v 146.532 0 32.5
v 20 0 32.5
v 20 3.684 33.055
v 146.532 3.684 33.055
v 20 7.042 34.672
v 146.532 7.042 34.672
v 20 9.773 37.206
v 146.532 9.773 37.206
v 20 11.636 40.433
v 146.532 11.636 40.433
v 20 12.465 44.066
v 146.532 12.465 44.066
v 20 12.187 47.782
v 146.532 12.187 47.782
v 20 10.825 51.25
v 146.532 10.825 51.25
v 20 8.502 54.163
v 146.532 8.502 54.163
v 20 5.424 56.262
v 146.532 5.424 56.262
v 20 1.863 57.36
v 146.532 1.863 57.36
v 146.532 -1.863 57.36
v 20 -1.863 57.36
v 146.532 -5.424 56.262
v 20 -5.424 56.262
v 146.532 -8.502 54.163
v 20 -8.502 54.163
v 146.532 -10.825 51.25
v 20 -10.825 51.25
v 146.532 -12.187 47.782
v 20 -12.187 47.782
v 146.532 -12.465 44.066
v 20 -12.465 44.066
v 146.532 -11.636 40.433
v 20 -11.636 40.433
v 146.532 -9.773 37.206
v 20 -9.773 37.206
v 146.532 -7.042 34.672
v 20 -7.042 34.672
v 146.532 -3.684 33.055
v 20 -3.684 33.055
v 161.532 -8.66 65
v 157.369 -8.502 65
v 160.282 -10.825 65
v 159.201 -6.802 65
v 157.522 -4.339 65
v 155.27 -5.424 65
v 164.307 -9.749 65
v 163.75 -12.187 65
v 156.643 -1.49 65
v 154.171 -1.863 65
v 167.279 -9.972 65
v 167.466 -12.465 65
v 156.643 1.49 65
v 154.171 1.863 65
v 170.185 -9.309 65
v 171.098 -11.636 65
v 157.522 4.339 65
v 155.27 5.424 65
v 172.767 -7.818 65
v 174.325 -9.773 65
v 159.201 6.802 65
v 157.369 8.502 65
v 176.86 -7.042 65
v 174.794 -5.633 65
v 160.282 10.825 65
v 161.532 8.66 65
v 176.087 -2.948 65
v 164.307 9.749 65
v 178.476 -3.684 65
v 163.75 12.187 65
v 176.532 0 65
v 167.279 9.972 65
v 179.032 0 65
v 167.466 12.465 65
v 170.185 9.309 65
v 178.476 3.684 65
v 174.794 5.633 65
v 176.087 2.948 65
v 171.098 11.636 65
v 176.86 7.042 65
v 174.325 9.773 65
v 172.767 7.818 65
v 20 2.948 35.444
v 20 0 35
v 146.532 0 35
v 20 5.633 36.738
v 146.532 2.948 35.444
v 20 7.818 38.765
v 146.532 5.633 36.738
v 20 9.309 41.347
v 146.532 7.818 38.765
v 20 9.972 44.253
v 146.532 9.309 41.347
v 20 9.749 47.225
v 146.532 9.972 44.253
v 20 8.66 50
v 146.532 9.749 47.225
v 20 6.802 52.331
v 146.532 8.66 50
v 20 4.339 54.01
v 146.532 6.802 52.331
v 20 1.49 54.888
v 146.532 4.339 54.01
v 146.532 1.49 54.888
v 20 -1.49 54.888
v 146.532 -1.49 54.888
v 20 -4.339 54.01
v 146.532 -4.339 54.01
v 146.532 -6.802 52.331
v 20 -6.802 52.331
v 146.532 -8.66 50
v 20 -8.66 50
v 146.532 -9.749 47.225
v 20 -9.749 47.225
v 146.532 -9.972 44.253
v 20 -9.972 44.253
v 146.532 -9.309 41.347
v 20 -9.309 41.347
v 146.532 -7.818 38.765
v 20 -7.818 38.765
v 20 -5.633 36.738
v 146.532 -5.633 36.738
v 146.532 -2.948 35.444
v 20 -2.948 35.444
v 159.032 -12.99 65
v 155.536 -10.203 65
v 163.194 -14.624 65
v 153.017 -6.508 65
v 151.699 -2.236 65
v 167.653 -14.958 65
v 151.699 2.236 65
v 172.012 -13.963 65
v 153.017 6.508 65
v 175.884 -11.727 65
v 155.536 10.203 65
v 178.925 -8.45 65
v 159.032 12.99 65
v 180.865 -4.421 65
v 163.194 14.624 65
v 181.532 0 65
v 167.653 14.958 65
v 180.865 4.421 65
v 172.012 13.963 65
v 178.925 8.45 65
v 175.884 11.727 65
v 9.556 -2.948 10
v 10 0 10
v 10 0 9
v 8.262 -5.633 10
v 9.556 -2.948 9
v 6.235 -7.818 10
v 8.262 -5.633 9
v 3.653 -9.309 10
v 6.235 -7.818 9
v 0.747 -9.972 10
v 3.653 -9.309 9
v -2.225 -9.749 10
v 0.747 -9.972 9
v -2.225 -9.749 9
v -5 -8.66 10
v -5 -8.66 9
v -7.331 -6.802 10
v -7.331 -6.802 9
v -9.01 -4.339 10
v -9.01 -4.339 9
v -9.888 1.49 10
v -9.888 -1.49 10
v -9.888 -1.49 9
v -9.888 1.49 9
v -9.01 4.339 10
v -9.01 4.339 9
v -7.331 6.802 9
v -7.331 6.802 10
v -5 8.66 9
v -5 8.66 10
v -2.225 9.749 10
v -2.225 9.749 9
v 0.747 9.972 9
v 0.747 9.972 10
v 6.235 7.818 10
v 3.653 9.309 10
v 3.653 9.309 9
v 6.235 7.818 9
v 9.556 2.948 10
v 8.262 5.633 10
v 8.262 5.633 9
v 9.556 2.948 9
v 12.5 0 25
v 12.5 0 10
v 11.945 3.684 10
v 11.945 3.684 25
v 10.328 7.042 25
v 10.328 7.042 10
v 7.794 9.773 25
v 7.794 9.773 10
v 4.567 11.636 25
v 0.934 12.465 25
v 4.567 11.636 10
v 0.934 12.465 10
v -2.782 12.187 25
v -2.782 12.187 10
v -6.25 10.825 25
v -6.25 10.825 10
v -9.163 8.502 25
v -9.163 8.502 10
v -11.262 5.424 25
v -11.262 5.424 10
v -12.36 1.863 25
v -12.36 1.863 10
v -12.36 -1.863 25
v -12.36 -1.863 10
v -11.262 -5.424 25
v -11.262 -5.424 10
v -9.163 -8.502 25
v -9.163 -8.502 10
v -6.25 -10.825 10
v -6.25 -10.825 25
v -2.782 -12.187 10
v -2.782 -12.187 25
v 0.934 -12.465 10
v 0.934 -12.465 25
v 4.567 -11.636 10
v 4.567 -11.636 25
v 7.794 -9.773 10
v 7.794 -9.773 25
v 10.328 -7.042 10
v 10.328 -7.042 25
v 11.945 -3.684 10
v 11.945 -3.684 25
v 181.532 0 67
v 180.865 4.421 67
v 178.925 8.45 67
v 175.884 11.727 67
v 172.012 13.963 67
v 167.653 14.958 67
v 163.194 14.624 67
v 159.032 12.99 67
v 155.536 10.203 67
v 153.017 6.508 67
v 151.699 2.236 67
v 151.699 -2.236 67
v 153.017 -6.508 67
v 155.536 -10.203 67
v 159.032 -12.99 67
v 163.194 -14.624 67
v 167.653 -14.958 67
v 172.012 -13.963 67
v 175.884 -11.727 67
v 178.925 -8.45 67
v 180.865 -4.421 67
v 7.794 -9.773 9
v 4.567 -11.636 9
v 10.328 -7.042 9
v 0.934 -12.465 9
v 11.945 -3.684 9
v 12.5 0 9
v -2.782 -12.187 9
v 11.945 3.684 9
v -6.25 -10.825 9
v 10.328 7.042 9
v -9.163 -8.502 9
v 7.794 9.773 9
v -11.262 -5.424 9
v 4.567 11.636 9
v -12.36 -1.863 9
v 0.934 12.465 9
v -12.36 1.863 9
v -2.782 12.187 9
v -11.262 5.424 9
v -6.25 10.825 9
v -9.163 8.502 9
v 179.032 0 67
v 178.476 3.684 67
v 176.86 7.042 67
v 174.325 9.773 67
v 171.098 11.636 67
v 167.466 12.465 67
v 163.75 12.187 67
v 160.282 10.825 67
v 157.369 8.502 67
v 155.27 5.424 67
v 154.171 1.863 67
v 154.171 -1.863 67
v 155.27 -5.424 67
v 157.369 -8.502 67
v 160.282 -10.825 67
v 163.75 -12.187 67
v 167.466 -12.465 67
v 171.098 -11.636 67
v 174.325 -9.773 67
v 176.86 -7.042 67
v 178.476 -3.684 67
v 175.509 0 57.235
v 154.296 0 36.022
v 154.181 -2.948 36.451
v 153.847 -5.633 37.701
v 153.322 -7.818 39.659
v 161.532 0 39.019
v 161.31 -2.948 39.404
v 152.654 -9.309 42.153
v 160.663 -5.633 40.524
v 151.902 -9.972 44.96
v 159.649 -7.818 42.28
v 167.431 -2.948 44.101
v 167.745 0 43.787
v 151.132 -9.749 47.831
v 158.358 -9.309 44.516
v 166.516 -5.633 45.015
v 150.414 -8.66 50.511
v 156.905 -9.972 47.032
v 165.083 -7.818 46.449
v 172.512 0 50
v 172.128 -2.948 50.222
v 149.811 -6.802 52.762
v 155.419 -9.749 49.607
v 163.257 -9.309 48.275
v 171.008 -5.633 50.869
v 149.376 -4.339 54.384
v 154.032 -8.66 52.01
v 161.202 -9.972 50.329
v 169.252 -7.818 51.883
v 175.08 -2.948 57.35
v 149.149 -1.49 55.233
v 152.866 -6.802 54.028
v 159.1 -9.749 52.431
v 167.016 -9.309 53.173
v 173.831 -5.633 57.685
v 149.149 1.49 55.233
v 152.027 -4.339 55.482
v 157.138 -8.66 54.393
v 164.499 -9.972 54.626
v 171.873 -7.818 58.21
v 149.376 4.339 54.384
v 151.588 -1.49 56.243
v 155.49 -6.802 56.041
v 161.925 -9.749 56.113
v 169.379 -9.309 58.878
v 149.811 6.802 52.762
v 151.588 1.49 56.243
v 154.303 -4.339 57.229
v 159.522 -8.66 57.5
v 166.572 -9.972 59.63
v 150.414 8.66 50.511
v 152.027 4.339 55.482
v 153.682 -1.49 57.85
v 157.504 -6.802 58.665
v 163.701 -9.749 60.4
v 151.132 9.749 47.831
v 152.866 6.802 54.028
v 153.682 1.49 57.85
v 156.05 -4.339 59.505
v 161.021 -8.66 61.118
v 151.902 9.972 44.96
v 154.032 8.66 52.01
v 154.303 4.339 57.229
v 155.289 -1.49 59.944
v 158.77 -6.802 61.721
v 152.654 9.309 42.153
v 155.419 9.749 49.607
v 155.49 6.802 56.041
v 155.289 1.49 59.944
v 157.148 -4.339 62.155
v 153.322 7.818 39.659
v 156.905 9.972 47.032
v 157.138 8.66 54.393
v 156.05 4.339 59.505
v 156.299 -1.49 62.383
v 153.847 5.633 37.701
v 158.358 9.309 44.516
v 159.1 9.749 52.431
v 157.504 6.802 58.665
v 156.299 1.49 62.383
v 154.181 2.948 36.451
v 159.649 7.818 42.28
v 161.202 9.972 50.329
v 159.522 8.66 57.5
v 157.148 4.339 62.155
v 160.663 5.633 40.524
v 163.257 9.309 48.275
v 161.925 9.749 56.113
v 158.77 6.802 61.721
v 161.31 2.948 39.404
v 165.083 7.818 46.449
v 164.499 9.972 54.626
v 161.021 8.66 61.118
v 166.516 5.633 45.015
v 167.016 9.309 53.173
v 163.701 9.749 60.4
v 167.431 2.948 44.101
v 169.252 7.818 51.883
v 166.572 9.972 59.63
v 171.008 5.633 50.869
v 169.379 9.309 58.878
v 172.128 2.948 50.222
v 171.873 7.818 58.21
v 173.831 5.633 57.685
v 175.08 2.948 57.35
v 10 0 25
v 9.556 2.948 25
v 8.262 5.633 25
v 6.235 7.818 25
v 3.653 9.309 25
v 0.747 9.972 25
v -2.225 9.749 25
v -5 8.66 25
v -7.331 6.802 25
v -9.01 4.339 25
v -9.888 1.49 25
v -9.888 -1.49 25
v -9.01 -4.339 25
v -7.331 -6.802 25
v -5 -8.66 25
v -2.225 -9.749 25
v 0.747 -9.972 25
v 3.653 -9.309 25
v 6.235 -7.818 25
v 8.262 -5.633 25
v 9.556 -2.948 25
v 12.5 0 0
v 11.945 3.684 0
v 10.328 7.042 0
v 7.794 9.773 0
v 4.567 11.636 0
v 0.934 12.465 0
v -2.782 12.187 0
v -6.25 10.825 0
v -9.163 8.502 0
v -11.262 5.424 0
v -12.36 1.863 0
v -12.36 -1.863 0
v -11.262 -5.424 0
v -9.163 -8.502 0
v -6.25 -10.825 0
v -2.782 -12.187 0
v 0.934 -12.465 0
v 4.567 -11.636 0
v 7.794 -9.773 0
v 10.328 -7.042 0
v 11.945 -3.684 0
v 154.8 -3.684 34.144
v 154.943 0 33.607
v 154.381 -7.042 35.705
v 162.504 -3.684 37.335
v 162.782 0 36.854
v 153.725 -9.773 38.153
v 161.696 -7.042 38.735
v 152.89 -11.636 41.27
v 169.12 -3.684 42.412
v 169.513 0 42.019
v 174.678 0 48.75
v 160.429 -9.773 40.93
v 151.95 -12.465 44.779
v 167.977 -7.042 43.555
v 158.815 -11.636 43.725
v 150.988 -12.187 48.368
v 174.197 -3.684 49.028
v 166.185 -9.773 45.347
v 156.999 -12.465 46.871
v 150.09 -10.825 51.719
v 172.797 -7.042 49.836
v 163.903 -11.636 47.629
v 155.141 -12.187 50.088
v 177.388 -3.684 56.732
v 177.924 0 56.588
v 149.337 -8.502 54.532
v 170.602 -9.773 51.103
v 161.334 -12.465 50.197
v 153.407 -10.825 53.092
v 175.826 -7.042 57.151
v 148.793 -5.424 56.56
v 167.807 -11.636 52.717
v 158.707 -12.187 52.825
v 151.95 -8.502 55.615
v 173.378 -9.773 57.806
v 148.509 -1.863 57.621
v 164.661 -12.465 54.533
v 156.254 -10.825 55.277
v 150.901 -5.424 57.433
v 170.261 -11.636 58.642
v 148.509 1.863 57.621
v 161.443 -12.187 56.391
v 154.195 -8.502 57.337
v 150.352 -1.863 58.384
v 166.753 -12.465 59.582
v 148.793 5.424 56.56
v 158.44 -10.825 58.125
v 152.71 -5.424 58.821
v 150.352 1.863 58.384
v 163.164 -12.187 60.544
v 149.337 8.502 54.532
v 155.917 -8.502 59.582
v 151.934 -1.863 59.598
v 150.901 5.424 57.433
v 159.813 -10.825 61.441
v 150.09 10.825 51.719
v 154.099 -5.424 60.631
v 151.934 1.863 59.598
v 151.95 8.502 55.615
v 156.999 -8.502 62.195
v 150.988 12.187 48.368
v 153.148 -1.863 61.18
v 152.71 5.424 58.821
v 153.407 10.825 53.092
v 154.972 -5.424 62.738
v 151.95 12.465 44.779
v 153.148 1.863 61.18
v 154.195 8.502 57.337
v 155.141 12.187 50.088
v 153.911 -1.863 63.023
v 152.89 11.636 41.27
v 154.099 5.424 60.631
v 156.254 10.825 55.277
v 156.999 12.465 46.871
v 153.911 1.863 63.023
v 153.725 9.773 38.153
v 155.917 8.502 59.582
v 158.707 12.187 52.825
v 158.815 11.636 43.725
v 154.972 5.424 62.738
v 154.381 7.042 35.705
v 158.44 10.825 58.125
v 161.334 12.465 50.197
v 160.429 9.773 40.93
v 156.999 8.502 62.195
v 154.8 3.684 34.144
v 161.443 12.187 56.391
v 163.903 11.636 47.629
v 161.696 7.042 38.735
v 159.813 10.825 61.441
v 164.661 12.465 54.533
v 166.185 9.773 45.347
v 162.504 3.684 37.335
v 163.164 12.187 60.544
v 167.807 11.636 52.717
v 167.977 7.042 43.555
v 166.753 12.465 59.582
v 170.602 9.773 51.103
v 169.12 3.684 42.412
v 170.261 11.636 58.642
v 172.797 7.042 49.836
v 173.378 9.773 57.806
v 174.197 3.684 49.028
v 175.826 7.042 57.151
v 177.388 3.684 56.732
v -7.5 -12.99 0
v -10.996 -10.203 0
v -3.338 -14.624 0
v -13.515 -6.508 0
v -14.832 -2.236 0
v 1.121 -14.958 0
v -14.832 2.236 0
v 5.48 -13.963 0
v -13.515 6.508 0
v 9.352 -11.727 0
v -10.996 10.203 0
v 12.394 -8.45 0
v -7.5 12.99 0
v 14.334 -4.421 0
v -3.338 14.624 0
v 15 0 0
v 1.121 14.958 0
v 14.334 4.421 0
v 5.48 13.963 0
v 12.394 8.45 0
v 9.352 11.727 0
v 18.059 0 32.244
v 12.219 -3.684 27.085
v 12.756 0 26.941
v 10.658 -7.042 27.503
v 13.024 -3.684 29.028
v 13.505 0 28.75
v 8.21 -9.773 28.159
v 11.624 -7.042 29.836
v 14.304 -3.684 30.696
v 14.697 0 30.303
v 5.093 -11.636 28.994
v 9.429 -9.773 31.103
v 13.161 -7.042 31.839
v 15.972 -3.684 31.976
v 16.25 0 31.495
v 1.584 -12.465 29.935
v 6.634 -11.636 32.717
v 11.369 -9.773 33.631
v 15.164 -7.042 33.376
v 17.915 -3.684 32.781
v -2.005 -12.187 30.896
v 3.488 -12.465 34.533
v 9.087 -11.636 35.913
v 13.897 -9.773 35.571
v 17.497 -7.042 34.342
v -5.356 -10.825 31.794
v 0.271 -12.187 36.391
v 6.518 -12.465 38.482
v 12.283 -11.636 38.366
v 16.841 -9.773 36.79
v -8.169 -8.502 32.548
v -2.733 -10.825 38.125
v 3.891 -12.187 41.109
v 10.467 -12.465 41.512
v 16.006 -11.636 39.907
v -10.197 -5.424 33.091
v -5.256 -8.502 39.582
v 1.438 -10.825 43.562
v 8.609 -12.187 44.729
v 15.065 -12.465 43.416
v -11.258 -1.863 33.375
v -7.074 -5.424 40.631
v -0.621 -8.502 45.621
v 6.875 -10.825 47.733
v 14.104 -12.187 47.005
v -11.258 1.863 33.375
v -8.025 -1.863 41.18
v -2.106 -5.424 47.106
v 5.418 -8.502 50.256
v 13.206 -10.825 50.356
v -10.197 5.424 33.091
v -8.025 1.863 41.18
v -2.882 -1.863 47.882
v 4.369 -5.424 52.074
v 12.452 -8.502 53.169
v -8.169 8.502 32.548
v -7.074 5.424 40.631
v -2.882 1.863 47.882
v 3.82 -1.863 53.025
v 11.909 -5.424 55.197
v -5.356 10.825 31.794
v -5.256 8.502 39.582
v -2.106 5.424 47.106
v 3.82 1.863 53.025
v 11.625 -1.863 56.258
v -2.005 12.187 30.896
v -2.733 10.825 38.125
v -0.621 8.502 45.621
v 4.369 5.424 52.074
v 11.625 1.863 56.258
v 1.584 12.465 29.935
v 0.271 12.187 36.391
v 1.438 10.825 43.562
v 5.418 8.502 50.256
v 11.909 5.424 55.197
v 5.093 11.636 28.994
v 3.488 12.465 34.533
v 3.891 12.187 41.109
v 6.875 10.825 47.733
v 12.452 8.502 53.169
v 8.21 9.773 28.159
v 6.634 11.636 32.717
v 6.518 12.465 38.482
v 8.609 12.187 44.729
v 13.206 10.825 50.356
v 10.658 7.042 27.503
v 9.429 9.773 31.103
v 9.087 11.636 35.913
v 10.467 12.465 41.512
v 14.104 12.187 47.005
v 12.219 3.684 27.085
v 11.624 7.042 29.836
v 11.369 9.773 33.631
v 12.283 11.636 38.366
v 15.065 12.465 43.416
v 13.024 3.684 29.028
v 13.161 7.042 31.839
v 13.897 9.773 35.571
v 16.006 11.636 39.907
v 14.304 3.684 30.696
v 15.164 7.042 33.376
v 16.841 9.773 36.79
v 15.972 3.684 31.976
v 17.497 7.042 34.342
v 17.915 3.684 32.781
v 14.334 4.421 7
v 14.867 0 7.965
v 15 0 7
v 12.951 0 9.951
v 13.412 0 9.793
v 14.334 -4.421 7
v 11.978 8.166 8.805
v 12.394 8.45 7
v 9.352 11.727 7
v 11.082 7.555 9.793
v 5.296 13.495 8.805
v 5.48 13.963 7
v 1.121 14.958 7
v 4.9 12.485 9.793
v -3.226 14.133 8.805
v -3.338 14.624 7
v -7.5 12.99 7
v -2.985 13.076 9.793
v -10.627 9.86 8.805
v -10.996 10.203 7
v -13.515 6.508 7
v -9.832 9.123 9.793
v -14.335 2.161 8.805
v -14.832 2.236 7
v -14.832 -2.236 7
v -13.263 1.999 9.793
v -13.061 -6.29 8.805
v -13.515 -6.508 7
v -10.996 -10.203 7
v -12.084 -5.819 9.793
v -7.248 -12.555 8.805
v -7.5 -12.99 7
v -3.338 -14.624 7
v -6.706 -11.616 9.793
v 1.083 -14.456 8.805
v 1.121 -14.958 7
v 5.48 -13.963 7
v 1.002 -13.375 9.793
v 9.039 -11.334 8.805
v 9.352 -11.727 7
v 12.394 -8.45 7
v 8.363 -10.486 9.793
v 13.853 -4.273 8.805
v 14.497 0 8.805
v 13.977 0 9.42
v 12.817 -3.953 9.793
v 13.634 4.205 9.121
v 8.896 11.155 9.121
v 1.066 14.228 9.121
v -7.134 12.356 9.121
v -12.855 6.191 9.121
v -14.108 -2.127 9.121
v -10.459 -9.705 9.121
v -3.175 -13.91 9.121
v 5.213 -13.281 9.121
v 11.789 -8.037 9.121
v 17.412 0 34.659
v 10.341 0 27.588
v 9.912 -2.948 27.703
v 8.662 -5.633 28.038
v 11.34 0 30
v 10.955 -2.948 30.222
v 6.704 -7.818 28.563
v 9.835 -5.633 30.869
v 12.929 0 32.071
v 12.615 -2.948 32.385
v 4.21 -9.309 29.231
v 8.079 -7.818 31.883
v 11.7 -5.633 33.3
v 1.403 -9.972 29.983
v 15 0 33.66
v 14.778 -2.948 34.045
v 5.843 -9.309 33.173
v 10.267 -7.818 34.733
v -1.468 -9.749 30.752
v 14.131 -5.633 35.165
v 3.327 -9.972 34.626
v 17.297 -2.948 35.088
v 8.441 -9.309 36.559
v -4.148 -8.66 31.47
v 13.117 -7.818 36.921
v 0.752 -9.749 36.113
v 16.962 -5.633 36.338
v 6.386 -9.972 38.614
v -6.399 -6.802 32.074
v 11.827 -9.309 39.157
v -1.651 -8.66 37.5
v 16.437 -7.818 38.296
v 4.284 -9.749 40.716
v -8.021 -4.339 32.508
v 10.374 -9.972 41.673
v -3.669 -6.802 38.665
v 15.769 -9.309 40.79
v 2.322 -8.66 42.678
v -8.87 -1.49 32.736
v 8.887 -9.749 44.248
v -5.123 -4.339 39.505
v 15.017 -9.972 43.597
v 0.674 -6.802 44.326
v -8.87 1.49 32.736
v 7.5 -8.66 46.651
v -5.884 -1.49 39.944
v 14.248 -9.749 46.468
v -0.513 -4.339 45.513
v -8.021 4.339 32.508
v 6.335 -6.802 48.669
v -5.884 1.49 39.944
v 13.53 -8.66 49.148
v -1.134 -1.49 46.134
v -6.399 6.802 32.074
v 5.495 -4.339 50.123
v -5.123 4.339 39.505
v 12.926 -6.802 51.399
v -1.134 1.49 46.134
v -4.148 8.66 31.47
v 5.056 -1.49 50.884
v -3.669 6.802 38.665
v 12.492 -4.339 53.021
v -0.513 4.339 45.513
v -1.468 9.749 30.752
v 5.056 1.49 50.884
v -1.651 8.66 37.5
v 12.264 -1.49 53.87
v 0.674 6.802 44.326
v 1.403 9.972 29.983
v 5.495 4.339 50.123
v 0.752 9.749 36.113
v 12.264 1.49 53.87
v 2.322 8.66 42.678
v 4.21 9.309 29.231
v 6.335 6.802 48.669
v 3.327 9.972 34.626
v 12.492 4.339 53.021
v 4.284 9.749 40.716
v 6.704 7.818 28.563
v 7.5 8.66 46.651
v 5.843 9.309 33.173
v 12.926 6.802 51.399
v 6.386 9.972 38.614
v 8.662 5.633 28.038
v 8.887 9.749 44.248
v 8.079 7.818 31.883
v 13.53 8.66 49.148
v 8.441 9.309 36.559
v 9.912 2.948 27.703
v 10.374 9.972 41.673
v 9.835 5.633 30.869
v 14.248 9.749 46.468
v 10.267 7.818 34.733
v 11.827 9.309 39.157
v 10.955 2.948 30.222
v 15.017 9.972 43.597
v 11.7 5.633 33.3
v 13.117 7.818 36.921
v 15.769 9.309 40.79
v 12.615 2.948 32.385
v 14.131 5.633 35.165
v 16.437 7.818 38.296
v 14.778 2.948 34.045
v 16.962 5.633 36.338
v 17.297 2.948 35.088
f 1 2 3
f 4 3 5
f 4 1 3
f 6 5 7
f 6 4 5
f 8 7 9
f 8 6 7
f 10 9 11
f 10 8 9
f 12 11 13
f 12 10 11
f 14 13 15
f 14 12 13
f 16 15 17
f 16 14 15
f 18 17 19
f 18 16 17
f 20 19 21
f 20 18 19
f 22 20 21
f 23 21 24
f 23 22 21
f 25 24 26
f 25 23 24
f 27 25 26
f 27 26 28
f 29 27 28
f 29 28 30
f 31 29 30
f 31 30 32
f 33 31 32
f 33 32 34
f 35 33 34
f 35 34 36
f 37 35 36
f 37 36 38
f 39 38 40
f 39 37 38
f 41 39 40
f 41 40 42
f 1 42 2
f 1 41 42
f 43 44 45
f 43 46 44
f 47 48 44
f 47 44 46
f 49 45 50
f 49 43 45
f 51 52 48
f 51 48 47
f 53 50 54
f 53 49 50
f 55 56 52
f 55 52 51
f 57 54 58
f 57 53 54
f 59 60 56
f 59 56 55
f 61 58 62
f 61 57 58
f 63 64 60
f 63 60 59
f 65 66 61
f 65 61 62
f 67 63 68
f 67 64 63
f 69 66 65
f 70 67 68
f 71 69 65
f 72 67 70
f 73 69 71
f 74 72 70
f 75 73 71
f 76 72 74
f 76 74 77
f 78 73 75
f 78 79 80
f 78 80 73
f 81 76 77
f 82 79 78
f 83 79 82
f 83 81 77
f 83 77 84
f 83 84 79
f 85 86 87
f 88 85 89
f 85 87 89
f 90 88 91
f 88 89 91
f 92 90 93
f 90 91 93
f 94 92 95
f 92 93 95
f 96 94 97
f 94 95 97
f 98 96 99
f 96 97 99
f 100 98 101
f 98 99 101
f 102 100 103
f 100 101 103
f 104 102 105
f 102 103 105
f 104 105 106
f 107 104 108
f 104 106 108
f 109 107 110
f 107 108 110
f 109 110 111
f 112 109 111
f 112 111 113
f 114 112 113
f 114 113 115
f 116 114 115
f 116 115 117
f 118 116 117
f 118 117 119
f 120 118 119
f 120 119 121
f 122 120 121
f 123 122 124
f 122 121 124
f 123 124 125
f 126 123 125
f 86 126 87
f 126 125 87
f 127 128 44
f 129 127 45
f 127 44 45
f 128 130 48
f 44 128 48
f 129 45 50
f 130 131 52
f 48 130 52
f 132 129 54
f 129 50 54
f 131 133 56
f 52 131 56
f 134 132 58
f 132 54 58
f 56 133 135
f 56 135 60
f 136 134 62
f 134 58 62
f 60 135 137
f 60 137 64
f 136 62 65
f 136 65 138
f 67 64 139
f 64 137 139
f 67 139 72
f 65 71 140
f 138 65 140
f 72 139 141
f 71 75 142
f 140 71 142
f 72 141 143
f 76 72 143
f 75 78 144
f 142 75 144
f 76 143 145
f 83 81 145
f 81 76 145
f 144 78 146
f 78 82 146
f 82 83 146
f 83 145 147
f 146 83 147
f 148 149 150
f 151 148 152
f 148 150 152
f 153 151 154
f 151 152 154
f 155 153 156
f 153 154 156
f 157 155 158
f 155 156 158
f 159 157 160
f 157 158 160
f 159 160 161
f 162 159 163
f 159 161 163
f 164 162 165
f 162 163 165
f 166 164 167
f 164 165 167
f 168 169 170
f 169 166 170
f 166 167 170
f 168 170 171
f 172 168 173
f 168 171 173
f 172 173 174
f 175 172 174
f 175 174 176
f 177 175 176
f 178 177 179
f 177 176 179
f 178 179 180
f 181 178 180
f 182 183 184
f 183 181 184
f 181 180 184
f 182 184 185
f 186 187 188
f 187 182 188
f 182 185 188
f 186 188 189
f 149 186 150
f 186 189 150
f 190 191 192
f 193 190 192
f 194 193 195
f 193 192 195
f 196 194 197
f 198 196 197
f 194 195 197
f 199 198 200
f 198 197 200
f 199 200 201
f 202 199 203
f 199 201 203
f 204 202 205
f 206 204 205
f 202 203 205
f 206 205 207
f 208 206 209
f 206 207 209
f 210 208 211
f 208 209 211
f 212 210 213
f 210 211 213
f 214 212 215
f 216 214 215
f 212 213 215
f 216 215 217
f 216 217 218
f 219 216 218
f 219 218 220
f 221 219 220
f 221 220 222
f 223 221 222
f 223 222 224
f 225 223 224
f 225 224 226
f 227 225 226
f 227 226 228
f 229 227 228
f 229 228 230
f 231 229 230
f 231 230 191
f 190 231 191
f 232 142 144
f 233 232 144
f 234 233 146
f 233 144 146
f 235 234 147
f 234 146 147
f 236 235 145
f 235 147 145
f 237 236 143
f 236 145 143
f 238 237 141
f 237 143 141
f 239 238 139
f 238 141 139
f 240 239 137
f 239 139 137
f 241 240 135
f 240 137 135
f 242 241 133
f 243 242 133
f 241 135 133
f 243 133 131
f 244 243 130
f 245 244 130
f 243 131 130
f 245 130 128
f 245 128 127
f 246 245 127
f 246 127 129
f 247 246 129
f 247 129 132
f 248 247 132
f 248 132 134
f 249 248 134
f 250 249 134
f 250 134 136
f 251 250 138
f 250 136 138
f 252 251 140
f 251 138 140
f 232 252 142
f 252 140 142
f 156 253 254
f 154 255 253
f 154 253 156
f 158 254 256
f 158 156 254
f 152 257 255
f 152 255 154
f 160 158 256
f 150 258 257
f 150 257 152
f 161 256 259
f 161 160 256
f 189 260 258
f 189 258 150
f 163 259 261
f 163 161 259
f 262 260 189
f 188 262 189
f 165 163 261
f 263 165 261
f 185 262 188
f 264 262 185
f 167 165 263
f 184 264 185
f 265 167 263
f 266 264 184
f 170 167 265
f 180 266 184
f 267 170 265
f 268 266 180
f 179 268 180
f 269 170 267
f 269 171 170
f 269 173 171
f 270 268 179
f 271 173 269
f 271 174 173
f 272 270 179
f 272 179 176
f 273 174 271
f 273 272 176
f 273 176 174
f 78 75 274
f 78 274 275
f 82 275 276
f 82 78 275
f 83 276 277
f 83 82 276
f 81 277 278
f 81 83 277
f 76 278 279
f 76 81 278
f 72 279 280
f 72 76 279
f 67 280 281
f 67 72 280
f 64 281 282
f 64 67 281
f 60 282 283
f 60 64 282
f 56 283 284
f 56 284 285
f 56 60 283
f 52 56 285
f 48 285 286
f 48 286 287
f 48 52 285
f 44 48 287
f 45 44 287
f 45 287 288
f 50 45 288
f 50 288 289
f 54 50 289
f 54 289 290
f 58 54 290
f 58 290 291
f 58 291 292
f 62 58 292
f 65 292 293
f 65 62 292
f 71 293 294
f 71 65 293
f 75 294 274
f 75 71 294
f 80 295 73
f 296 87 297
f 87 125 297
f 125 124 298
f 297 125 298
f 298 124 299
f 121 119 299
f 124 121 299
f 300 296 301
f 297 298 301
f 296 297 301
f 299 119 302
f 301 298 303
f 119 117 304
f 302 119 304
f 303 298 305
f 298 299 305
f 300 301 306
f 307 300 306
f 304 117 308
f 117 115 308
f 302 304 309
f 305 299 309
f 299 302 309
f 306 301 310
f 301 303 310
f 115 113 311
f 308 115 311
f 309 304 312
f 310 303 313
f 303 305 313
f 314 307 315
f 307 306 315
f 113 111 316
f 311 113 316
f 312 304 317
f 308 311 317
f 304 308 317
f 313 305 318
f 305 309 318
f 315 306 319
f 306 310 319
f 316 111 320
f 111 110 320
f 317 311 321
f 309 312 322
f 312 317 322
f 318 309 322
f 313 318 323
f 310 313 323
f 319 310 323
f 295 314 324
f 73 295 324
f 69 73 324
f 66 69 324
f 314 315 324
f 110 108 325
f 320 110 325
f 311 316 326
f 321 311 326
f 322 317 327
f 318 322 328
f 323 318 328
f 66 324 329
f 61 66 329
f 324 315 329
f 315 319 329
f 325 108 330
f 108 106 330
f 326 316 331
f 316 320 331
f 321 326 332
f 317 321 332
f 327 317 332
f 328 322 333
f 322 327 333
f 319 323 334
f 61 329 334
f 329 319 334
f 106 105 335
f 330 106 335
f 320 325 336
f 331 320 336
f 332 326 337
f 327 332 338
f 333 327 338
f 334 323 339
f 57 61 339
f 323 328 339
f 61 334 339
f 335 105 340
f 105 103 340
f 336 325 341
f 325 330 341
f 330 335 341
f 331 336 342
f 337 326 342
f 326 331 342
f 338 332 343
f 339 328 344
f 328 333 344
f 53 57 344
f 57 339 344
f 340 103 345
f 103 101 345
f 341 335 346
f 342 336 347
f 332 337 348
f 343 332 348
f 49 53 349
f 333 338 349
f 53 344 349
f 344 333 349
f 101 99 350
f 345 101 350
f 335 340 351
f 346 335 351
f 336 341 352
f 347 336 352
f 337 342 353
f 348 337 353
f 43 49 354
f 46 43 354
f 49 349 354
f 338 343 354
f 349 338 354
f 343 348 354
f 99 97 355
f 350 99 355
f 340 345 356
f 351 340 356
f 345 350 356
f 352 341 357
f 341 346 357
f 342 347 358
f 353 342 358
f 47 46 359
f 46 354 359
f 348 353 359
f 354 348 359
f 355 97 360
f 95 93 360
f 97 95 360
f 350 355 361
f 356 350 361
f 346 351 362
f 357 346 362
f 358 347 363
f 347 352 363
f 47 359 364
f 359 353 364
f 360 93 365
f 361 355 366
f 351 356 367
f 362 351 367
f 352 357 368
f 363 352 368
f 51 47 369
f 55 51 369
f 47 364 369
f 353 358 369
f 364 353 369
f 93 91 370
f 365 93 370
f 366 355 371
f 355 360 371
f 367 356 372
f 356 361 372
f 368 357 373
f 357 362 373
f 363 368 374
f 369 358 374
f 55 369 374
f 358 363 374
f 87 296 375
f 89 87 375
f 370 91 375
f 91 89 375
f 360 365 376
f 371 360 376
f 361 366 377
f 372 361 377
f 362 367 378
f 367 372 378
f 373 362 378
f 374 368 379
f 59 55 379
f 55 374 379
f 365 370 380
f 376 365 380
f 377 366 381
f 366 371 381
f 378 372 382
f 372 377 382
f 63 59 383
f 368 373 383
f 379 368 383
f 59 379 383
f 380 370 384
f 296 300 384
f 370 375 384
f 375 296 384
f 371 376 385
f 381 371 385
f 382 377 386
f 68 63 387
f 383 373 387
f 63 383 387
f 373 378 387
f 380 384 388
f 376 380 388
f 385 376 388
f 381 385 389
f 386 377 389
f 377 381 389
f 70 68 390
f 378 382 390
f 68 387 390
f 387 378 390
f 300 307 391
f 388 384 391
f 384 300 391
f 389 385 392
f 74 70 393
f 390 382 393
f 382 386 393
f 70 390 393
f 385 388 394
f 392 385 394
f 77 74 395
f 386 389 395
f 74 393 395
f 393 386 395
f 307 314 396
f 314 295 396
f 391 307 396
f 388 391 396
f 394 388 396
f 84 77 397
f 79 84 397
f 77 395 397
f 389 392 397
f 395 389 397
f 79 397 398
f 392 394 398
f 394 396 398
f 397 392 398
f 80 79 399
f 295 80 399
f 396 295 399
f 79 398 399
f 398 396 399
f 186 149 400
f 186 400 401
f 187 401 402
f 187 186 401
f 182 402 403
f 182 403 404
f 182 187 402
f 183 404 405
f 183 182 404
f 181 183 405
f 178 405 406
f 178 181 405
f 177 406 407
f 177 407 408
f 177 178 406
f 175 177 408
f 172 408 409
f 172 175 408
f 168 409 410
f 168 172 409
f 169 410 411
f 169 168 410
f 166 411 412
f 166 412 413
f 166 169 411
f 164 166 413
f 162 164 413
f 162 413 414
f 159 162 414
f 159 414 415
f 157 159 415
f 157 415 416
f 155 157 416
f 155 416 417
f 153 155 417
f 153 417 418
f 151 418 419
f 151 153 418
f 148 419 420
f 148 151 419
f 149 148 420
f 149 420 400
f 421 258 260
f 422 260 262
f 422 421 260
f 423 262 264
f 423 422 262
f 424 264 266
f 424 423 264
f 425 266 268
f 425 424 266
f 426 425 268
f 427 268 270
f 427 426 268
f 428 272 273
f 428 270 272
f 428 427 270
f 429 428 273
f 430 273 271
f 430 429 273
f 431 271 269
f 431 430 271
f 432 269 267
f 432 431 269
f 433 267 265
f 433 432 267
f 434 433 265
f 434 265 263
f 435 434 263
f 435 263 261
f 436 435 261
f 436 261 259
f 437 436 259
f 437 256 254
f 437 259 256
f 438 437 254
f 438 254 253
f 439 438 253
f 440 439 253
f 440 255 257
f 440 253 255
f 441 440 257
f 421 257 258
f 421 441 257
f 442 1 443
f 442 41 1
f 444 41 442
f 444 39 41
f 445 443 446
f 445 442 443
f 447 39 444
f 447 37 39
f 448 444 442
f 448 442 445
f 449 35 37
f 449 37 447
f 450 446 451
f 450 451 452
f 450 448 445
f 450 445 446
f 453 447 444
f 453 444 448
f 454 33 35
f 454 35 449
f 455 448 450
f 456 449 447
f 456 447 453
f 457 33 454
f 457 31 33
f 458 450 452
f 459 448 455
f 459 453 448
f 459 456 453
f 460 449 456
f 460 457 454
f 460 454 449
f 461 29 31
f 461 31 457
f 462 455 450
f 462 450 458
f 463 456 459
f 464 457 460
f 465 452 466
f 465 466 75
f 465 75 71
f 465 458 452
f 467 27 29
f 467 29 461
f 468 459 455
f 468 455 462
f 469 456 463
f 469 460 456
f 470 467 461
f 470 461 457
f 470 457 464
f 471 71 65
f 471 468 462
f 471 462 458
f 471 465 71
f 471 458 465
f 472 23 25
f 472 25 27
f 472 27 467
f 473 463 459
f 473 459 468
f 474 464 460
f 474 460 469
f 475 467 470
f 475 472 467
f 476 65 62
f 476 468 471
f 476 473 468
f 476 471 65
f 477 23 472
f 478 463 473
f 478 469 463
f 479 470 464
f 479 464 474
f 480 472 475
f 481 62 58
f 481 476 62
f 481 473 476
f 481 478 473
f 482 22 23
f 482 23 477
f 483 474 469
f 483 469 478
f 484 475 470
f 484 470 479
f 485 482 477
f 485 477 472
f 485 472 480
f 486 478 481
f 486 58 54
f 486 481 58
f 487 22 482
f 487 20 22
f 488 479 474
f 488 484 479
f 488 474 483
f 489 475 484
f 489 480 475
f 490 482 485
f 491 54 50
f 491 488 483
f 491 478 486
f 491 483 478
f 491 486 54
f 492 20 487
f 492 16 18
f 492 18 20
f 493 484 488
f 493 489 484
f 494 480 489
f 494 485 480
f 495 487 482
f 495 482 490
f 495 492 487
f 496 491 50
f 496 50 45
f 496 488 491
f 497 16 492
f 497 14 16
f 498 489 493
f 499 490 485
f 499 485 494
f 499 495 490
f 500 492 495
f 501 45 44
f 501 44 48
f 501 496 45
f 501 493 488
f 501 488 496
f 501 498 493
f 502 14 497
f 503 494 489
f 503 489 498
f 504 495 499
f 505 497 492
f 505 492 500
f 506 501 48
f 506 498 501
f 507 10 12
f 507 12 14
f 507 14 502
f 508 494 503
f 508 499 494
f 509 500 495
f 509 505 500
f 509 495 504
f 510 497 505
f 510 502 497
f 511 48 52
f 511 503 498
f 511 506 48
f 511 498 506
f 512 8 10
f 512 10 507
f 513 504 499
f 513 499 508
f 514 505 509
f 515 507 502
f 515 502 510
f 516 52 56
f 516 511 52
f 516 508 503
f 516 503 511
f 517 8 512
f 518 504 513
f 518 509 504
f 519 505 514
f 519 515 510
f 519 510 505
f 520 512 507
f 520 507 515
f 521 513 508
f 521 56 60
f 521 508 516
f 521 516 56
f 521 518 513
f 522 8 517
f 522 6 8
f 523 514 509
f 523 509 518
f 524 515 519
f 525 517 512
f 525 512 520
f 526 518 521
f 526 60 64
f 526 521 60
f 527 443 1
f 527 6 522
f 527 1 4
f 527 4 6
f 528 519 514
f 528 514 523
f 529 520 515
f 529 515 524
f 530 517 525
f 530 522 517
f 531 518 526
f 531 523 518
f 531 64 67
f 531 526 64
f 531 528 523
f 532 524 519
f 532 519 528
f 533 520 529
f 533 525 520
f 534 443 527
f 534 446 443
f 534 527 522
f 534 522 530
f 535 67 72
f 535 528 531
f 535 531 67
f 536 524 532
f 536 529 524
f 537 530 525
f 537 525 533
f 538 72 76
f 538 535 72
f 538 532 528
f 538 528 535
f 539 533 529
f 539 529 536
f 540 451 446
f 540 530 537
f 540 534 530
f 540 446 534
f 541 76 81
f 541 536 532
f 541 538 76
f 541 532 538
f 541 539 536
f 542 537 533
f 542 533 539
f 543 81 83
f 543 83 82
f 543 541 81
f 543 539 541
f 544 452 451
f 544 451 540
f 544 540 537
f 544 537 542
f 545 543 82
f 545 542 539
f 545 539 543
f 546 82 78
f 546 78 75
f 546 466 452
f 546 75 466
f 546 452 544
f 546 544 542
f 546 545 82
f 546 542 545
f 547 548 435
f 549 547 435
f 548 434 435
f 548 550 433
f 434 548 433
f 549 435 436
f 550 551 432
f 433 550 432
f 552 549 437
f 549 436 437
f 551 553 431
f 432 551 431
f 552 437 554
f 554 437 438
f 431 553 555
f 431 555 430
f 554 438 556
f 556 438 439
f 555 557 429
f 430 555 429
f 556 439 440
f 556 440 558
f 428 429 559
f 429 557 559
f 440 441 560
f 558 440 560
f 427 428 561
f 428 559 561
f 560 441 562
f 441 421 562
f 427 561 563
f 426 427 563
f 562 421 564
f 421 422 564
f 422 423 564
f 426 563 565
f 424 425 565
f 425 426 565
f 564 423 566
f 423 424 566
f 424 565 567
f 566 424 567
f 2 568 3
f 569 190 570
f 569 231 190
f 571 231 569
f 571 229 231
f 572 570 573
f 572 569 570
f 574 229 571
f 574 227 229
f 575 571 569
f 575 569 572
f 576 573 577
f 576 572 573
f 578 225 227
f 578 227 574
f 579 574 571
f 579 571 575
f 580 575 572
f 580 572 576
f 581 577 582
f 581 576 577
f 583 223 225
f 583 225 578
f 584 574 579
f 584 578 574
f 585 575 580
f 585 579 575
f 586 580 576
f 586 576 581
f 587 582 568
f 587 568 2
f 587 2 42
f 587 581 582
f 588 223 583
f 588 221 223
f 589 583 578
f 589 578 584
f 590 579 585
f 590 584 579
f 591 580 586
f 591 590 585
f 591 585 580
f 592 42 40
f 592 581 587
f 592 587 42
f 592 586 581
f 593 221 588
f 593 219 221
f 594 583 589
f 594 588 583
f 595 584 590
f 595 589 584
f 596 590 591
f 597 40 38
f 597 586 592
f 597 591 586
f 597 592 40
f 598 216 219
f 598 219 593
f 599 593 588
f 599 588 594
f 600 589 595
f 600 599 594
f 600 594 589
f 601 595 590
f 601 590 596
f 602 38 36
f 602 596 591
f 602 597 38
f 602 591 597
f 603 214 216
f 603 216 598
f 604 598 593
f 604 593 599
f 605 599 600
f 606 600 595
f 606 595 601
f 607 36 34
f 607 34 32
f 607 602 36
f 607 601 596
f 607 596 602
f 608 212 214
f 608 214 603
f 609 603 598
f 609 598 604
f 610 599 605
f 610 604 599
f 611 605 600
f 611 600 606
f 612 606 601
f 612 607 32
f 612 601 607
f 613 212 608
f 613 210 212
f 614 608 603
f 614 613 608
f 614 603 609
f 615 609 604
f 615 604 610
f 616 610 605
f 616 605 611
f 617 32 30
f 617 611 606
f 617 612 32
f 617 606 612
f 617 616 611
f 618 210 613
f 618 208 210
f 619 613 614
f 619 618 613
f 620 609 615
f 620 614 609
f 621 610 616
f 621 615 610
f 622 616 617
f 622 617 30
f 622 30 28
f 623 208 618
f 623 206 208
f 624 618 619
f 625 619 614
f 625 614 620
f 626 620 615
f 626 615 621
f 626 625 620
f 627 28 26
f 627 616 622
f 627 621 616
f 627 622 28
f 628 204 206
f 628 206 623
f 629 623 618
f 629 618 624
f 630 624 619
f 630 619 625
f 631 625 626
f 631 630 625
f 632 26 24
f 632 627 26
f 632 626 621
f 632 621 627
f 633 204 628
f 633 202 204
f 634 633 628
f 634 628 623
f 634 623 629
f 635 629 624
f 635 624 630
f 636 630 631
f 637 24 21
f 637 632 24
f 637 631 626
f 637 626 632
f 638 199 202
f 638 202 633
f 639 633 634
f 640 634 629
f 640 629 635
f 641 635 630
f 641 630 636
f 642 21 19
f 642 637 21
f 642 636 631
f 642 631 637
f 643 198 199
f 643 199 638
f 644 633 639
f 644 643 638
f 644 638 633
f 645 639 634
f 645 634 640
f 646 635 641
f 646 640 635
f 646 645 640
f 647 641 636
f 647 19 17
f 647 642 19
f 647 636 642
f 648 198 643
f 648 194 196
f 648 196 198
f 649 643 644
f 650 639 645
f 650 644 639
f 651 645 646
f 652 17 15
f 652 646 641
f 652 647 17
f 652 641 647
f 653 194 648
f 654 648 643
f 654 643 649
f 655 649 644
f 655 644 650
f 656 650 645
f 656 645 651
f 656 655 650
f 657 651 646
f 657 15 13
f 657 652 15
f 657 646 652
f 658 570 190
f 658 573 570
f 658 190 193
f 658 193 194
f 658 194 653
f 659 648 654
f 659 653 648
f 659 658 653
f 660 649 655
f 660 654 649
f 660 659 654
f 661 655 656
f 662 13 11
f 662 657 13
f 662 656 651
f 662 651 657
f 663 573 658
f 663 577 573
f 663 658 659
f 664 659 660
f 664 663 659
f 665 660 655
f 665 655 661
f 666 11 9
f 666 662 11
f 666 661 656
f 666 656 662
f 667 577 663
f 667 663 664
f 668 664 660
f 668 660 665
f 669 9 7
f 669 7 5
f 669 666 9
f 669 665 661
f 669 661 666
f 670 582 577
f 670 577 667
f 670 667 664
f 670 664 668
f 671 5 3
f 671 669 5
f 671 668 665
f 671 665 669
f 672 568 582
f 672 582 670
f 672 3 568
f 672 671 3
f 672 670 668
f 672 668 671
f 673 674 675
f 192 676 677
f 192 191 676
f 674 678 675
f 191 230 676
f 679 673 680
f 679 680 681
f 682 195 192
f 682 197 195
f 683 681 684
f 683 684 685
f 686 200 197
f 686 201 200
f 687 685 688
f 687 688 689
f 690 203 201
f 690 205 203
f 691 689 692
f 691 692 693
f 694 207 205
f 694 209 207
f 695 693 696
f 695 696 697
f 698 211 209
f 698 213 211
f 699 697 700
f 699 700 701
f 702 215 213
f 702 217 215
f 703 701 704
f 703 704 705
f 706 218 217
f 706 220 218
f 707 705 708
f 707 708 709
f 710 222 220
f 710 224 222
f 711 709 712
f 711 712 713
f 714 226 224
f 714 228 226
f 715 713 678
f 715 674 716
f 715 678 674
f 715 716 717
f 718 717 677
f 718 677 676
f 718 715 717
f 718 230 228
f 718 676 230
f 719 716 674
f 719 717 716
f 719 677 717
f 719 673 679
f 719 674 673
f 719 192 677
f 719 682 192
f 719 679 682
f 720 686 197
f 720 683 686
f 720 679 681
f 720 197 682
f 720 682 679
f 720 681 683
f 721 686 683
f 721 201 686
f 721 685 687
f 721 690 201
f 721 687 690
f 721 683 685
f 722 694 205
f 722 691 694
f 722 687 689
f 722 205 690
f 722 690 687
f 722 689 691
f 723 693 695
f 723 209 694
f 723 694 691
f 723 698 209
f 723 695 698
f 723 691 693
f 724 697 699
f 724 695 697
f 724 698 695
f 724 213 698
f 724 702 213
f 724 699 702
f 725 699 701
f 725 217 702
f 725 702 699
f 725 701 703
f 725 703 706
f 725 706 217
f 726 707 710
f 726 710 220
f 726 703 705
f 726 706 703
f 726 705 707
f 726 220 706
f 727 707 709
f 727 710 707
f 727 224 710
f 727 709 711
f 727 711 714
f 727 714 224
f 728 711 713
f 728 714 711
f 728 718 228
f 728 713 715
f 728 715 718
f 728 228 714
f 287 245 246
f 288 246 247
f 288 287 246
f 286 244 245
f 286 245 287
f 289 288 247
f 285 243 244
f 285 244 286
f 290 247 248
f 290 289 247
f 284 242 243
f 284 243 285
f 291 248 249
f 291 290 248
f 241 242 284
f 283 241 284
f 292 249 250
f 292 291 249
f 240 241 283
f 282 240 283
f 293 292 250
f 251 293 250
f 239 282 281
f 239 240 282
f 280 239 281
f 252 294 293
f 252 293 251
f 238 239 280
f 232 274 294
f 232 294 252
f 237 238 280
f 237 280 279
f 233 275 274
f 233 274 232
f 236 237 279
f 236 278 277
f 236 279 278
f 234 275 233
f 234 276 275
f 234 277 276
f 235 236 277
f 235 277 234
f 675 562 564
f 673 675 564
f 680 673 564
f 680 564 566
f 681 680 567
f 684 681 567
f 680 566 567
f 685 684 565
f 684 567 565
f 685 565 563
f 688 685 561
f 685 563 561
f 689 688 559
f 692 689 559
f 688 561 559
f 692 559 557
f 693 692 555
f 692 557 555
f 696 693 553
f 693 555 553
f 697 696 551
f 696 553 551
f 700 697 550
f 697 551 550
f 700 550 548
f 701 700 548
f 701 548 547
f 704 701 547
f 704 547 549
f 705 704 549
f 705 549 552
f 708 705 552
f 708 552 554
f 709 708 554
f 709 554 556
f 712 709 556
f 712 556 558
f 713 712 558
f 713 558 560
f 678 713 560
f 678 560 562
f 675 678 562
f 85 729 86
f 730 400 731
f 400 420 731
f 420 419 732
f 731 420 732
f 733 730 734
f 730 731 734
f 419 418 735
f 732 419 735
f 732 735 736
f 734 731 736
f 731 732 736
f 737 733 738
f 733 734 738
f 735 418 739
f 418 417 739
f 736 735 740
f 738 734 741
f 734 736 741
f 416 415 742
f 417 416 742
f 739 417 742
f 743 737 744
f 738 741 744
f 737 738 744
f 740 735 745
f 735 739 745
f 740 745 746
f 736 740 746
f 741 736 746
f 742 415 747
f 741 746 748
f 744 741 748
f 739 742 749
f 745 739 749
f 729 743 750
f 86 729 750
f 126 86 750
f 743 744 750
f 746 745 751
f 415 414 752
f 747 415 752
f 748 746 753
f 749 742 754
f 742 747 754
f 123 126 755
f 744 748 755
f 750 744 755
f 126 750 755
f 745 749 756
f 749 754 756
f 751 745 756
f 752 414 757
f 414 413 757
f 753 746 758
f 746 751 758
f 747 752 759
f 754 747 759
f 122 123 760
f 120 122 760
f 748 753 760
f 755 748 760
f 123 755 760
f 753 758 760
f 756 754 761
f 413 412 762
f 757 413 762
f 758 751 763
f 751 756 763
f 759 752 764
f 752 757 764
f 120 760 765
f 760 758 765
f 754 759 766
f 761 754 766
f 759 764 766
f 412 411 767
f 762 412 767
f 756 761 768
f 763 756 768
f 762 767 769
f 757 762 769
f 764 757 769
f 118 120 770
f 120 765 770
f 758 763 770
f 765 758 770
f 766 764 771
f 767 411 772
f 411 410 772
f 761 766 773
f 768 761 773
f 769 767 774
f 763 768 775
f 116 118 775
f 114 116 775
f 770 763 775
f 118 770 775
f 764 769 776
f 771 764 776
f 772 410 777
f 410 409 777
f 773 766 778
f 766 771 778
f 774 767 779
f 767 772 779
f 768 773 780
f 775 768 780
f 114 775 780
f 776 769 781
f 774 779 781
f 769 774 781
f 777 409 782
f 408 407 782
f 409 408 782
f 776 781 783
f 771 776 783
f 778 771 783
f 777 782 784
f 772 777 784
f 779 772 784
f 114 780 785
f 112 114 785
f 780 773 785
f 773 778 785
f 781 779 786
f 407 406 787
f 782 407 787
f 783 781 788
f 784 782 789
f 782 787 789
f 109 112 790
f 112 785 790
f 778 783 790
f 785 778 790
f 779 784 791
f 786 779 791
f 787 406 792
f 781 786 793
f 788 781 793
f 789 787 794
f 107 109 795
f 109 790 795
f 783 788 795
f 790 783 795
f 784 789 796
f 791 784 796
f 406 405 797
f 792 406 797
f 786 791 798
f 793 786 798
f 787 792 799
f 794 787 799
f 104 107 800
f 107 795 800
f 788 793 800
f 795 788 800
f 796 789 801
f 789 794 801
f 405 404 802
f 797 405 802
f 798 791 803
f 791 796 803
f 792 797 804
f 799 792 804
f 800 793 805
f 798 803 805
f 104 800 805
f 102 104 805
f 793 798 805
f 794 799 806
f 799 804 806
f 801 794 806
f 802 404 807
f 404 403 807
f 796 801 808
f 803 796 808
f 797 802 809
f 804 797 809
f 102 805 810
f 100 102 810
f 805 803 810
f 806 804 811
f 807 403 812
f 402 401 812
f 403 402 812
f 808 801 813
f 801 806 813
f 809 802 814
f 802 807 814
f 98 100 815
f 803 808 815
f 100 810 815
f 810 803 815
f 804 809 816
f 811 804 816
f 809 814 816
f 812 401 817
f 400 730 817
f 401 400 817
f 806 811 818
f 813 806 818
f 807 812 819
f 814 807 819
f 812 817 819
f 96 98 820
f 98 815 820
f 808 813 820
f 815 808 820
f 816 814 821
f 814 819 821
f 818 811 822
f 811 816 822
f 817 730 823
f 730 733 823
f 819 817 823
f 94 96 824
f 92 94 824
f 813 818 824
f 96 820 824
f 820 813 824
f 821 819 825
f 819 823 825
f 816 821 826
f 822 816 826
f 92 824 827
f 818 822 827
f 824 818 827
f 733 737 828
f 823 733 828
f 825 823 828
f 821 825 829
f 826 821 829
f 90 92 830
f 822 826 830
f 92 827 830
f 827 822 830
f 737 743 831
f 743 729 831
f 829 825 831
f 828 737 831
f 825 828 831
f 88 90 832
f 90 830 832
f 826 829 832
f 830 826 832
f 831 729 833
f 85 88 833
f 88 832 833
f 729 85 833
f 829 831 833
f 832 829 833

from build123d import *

# Parameters (mm, degrees)
CROQUIS1_R              = 15
CROQUIS1_R_2            = 12.5
SALIENTE_EXTRUIR1_DEPTH = 10
CROQUIS2_R              = 12.5
CROQUIS2_R_2            = 10
SALIENTE_EXTRUIR2_DEPTH = 15
REDONDEO3_SIZE          = 3
REDONDEO3_SIZE_2        = 2.5
SALIENTE_EXTRUIR3_START = 1
CROQUIS3_R              = 12.5
CROQUIS3_R_2            = 10
SALIENTE_EXTRUIR3_DEPTH = 1
CROQUIS6_R              = 12.5
CROQUIS6_R_2            = 10
CROQUIS7_R              = 15
CROQUIS7_R_2            = 12.5
SALIENTE_EXTRUIR4_DEPTH = 2


with BuildPart() as part:
    # Croquis1 → Saliente-Extruir1 (new body)
    with BuildSketch(Plane.XY):
        Circle(CROQUIS1_R)
        Circle(CROQUIS1_R_2, mode=Mode.SUBTRACT)
    extrude(amount=SALIENTE_EXTRUIR1_DEPTH)

    # Redondeo3
    # an asymmetric fillet: 3, 2.5 mm, written as the material it takes off along each edge
    with BuildSketch(Plane(origin=(0, 0, 10), x_dir=(1, 0, 0), z_dir=(0, -1, 0))) as redondeo3_piece_1:
        with BuildLine():
            Bezier((15, -REDONDEO3_SIZE), (15, 0), (15 - REDONDEO3_SIZE_2, 0), weights=[1, 0.707106781, 1])
            Line((15 - REDONDEO3_SIZE_2, 0), (15, 0))
            Line((15, 0), (15, -REDONDEO3_SIZE))
        make_face()
    revolve(axis=Axis((0, 0, 10), (0, 0, 1)), mode=Mode.SUBTRACT)



with BuildPart() as body_2:
    # Croquis2 → Saliente-Extruir2 (new body)
    with BuildSketch(Plane.XY.offset(10)):
        Circle(CROQUIS2_R)
        Circle(CROQUIS2_R_2, mode=Mode.SUBTRACT)
    extrude(amount=SALIENTE_EXTRUIR2_DEPTH)


with BuildPart() as part_1:
    add(part.part)

    add(body_2.part)  # Saliente-Extruir3 merges body 2
    # Croquis3 → Saliente-Extruir3 (add)
    with BuildSketch(Plane(origin=(0, 0, 10), x_dir=(-1, 0, 0), z_dir=(0, 0, -1)).offset(SALIENTE_EXTRUIR3_START)):
        Circle(CROQUIS3_R)
        with Locations(Location((0, 0, 0), (0, 0, 180))):
            Circle(CROQUIS3_R_2, mode=Mode.SUBTRACT)
    extrude(amount=-SALIENTE_EXTRUIR3_DEPTH)

    # Barrer1: sweep along a path in Croquis5
    with BuildLine(Plane(origin=(0, 0, 0), x_dir=(1, 0, 0), z_dir=(0, 1, 0))) as barrer1_path:
        ThreePointArc((0, -25), (5.857864376, -39.142135624), (20, -45))
        Line((20, -45), (146.5317248, -45))
        ThreePointArc((146.5317248, -45), (160.673860424, -50.857864376), (166.5317248, -65))
    # Croquis6 → Barrer1 (sweep)
    with BuildSketch(Plane.XY.offset(25)):
        Circle(CROQUIS6_R)
        Circle(CROQUIS6_R_2, mode=Mode.SUBTRACT)
    sweep(path=barrer1_path.line)


with BuildPart() as body_2_2:
    # Croquis7 → Saliente-Extruir4 (new body)
    with BuildSketch(Plane.XY.offset(65)):
        with Locations((166.5317248, 0)):
            Circle(CROQUIS7_R)
        with Locations((166.5317248, 0)):
            Circle(CROQUIS7_R_2, mode=Mode.SUBTRACT)
    extrude(amount=SALIENTE_EXTRUIR4_DEPTH)


solid = Compound([part_1.part, body_2_2.part])
